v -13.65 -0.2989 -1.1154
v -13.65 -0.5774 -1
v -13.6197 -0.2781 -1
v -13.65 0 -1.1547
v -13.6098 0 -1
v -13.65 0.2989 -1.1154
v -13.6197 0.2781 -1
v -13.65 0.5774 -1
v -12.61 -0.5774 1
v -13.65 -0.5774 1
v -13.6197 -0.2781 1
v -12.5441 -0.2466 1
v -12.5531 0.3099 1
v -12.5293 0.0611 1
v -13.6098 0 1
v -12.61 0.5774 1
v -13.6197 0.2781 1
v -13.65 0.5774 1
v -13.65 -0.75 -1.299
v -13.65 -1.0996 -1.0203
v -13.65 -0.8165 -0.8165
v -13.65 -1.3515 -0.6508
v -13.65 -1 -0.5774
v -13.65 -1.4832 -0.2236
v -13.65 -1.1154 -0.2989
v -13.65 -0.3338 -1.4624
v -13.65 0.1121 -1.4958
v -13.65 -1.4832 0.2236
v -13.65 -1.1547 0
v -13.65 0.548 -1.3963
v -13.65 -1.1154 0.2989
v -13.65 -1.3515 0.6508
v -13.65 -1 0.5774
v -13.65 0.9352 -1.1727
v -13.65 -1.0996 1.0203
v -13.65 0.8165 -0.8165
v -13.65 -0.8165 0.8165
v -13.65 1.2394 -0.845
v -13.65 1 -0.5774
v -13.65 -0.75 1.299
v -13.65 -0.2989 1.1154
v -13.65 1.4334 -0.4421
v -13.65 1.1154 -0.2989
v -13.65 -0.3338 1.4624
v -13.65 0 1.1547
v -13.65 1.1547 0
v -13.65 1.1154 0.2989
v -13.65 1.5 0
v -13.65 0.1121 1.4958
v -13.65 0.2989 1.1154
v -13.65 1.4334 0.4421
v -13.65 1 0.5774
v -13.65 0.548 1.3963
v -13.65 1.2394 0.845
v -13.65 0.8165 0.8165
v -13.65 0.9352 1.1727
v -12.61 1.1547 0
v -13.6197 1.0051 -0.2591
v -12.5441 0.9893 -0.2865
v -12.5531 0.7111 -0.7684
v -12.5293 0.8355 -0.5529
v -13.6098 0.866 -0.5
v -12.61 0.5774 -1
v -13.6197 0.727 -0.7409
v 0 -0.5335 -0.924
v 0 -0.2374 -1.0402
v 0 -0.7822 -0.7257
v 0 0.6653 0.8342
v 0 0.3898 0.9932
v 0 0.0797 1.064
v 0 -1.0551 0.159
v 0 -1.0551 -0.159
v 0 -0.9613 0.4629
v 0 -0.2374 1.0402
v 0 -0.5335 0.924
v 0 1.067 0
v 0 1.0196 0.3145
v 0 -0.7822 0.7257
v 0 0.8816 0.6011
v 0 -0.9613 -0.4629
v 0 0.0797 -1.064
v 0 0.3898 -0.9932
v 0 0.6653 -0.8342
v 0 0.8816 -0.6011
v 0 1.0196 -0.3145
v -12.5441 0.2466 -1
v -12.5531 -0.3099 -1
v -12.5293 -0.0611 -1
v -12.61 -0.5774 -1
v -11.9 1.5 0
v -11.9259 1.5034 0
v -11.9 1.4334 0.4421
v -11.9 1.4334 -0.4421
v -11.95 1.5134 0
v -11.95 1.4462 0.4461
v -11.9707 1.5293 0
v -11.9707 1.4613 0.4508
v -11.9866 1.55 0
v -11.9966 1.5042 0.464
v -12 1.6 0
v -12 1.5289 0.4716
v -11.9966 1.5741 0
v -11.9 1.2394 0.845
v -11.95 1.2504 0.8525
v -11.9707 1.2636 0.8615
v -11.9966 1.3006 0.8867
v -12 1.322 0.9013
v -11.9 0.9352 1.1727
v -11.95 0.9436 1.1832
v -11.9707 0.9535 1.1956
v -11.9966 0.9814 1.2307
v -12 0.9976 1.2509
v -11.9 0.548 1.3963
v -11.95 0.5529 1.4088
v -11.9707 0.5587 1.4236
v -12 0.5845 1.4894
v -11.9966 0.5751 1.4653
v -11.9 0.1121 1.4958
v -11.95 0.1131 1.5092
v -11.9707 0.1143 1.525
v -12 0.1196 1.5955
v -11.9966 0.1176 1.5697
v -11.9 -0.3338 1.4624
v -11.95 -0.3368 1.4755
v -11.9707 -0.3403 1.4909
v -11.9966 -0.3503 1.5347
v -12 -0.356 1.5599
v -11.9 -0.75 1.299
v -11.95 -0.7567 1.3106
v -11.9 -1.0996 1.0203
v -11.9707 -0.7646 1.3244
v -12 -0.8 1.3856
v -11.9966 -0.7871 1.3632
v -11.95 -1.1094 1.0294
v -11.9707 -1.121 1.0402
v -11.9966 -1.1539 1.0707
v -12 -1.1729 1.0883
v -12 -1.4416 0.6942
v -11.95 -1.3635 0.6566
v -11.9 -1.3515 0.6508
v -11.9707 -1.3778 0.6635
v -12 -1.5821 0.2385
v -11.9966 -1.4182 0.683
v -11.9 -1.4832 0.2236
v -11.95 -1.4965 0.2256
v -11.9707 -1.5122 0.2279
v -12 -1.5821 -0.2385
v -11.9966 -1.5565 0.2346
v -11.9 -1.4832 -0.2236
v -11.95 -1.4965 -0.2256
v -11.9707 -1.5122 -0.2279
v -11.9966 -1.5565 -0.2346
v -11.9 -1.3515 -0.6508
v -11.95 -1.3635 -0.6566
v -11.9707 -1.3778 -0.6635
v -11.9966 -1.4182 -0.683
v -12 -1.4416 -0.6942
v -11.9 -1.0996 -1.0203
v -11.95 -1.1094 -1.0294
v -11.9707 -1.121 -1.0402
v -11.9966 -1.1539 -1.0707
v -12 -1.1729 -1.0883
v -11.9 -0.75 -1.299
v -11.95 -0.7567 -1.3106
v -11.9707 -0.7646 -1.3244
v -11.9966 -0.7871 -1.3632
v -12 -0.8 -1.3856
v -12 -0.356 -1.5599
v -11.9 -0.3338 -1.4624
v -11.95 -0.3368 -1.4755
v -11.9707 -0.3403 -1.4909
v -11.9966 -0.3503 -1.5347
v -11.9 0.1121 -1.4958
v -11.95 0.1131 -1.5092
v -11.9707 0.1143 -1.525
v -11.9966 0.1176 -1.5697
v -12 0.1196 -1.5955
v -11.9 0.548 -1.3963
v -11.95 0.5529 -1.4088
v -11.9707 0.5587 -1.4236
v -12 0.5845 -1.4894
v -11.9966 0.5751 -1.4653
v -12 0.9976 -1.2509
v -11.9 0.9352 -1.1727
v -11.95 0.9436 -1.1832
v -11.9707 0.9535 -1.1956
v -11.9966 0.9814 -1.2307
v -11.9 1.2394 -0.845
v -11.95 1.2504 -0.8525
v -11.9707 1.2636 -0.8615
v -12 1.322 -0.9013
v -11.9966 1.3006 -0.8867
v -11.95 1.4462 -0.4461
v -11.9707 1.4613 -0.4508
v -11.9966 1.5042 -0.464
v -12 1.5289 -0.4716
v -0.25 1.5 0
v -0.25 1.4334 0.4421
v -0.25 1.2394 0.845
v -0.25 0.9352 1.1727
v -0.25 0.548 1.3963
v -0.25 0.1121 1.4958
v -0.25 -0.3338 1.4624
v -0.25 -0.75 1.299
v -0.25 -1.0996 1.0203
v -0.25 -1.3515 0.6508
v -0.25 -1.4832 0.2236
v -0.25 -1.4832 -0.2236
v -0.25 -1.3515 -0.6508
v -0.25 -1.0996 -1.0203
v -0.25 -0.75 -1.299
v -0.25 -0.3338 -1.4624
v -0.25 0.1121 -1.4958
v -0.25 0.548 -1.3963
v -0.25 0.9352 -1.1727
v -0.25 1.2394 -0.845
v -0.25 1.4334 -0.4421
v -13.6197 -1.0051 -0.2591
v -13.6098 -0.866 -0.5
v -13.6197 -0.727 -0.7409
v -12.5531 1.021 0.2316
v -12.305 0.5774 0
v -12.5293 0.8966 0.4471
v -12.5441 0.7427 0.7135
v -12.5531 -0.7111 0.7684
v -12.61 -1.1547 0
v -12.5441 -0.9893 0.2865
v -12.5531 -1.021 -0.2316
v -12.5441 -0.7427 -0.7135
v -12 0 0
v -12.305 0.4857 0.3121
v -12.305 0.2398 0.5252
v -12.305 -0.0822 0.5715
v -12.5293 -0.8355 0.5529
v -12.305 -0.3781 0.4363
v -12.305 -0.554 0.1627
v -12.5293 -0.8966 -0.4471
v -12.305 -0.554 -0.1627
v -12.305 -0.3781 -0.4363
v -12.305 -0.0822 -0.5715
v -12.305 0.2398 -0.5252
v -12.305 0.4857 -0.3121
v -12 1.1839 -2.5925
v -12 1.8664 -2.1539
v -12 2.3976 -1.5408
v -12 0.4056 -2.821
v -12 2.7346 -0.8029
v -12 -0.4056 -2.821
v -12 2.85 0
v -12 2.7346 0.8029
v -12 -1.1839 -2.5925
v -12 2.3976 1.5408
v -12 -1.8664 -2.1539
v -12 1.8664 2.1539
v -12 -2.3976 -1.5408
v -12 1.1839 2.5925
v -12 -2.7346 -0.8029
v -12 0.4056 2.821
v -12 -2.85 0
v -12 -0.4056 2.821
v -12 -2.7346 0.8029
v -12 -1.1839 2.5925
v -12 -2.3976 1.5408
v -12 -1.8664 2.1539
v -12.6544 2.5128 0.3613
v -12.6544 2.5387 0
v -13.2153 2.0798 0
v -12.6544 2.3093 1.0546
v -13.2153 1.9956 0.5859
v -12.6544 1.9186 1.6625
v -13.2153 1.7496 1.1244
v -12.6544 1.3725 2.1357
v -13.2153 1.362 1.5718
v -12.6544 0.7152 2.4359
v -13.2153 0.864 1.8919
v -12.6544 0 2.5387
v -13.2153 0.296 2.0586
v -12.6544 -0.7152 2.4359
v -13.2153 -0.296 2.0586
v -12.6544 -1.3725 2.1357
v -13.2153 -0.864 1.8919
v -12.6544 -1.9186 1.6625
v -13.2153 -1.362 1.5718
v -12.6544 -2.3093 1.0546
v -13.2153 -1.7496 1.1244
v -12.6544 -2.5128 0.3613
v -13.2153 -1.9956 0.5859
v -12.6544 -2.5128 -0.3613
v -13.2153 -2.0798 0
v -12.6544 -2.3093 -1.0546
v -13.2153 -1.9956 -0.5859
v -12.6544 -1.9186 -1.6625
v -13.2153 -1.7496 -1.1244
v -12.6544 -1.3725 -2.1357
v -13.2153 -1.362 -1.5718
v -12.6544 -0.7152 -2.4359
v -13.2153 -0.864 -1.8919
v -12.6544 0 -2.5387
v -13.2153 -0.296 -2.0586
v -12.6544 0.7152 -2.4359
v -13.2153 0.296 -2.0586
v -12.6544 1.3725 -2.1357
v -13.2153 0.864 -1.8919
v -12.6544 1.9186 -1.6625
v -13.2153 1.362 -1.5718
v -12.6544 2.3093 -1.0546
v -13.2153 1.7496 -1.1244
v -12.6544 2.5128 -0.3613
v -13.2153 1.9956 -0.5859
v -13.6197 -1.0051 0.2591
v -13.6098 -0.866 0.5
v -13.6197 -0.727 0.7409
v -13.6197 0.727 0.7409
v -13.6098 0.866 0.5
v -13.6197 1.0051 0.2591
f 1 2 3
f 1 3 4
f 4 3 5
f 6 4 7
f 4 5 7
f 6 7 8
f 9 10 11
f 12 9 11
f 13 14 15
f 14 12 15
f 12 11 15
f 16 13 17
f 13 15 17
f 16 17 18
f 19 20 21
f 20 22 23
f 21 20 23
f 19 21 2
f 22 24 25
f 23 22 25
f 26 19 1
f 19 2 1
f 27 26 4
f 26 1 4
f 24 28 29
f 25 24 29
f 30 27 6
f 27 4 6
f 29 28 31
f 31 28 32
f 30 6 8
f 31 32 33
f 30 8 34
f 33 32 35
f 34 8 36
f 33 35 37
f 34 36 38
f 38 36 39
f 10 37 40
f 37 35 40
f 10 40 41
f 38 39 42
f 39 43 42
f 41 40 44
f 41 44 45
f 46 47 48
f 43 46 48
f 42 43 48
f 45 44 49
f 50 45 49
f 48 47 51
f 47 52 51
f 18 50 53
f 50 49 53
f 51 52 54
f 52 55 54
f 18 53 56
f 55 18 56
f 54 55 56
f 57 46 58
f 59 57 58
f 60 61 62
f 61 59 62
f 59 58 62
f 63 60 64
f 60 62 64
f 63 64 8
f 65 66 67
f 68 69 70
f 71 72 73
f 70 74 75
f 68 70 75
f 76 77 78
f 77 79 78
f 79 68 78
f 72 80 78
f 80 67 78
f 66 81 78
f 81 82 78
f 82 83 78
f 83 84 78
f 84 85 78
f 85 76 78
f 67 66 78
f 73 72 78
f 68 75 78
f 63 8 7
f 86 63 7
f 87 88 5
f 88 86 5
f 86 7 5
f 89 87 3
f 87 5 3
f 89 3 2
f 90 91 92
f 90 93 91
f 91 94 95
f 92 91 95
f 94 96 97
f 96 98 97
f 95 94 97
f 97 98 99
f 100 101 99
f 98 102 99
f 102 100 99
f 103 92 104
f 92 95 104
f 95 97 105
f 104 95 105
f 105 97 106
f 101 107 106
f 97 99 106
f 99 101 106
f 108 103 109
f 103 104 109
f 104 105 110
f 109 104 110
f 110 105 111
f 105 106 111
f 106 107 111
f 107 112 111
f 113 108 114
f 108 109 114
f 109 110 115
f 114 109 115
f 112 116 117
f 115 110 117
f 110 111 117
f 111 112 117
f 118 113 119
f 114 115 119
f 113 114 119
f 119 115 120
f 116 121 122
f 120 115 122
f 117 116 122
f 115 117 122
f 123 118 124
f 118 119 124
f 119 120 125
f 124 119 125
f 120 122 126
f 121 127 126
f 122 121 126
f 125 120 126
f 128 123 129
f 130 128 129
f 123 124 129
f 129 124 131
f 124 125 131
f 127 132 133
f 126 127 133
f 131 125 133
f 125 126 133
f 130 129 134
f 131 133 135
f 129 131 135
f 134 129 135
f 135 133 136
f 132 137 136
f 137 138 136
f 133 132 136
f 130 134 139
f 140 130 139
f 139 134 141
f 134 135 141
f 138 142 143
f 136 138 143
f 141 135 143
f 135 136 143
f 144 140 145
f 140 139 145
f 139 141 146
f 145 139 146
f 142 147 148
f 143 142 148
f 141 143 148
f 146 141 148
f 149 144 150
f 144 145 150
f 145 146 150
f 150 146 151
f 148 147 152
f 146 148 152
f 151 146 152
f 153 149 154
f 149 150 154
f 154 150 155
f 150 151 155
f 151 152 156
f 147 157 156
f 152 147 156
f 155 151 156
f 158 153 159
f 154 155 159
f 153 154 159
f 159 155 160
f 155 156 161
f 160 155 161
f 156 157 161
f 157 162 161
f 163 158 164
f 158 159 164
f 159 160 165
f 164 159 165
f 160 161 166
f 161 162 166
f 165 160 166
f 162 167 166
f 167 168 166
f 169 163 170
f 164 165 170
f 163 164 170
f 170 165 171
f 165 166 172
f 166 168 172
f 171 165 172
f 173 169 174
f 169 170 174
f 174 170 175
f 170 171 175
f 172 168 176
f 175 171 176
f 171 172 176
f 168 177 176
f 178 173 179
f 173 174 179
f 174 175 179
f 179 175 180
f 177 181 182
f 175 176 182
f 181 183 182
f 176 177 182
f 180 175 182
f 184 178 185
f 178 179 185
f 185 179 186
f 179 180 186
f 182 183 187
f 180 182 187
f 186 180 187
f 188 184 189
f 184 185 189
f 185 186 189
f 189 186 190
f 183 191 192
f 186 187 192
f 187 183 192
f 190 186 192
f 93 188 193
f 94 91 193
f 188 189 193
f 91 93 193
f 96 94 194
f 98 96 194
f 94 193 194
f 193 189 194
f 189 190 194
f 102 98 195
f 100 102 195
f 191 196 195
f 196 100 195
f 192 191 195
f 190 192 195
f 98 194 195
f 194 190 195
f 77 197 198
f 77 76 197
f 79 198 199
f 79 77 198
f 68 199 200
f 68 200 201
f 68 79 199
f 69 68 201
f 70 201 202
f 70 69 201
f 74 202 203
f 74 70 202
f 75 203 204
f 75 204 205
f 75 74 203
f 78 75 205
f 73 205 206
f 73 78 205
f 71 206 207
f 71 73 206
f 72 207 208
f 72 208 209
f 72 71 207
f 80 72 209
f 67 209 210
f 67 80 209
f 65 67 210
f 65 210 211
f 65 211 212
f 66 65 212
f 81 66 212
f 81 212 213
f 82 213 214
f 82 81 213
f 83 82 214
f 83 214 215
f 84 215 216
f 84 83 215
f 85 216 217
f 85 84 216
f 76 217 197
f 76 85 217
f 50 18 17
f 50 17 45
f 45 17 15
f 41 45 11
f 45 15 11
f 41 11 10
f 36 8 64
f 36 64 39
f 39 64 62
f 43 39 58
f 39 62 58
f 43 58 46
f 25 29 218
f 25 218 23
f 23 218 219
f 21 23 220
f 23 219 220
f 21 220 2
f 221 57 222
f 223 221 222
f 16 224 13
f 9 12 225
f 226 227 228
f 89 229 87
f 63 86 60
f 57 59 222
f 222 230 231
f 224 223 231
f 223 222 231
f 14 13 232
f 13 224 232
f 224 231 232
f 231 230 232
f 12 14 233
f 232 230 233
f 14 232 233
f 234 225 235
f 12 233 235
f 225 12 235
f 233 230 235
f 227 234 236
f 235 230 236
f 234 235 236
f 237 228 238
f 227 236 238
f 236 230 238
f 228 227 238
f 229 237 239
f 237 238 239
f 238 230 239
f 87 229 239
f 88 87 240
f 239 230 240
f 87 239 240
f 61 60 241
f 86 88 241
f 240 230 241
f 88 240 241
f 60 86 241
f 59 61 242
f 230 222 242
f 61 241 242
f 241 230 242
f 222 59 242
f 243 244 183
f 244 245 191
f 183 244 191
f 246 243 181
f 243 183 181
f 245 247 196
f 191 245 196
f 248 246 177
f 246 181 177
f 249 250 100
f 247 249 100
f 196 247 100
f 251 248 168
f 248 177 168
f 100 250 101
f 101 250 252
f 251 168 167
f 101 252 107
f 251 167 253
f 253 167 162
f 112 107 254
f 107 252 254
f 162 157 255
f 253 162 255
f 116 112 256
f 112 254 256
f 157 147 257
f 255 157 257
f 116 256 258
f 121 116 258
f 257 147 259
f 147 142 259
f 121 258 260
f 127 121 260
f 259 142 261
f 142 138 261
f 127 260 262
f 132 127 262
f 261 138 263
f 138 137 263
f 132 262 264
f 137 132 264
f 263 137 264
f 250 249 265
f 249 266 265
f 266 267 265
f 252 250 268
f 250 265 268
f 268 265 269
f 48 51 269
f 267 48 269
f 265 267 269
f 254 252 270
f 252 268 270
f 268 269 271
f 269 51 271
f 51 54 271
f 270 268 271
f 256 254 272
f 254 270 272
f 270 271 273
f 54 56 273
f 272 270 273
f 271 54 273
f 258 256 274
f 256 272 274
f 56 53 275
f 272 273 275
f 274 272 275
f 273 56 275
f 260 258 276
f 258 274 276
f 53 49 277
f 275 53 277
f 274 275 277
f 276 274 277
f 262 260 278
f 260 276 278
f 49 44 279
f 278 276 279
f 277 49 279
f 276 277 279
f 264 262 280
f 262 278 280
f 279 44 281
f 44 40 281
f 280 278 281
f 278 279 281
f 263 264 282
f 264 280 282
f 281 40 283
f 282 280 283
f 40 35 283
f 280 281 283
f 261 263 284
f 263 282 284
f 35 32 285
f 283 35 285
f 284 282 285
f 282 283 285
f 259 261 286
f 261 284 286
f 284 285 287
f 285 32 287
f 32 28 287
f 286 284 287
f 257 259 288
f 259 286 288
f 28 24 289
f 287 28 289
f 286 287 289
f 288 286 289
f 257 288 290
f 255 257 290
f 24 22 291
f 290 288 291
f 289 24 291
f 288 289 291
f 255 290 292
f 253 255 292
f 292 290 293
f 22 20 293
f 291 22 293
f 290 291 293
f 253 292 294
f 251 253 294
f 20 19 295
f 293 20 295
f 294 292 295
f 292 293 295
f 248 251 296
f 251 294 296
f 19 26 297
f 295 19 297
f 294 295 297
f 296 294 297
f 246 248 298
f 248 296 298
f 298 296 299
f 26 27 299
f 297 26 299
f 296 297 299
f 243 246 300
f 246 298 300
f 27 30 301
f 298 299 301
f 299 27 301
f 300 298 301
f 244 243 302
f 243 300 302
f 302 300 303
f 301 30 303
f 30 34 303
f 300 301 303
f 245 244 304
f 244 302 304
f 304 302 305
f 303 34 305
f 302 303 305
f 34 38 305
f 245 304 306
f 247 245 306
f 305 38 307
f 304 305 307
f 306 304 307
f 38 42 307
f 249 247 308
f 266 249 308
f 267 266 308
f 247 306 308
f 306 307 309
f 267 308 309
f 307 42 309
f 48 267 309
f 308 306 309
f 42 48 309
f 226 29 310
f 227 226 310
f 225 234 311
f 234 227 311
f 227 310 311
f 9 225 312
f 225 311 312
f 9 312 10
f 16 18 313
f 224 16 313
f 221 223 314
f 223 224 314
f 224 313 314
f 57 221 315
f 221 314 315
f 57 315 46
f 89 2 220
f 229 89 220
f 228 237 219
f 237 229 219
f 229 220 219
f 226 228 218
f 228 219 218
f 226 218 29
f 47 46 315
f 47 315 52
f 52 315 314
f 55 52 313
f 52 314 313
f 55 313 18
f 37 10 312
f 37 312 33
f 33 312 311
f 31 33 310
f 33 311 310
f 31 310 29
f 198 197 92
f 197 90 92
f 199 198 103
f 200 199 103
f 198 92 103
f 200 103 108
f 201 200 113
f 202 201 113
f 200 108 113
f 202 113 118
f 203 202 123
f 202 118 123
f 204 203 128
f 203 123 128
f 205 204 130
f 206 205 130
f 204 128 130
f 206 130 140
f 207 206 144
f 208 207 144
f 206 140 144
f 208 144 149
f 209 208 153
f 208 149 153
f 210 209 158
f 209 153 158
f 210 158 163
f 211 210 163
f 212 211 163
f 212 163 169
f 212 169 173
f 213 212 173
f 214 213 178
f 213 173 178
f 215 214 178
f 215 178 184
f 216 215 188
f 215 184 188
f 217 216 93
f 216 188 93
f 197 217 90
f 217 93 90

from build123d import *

# Parameters (mm, degrees)
CUT_EXTRUDE_1_DEPTH = 1.65


with BuildPart() as part:
    # 草图1 → 旋转1 (revolve)
    with BuildSketch(Plane.XY):
        with BuildLine():
            Line((0, 1.5), (-11.9, 1.5))
            ThreePointArc((-11.9, 1.5), (-11.970710678, 1.529289322), (-12, 1.6))
            Line((-12, 1.6), (-12, 2.85))
            ThreePointArc((-12, 2.85), (-12.948716751, 2.326209363), (-13.65, 1.5))
            Line((-13.65, 1.5), (-13.65, 0))
            Line((-13.65, 0), (0, 0))
            Line((0, 0), (0, 1.5))
        make_face()
    revolve(axis=Axis((-13.65, 0, 0), (1, 0, 0)))

    # 草图2 → 切除-拉伸1 (cut)
    with BuildSketch(Plane.ZY.offset(13.65)):
        Polygon((0, 1.154700538), (-1, 0.577350269), (-1, -0.577350269), (0, -1.154700538), (1, -0.577350269), (1, 0.577350269), align=None)
    extrude(amount=-CUT_EXTRUDE_1_DEPTH, mode=Mode.SUBTRACT)

    # 草图6 → 旋转2 (revolve)
    with BuildSketch(Plane.XY):
        Polygon((-12.61, 1.154700538), (-12, 0), (-11.7, 0), (-11.7, 1.154700538), align=None)
    revolve(axis=Axis((-13.65, 0, 0), (1, 0, 0)))

    # 草图7 → 切除-旋转5 (revolve, cut)
    with BuildSketch(Plane.XY):
        Polygon((-13.65, 1.154700538), (-13.35, 0), (-13.65, 0), align=None)
    revolve(axis=Axis((-13.65, 0, 0), (1, 0, 0)), mode=Mode.SUBTRACT)

    # 草图4 → 切除-旋转1 (revolve, cut)
    with BuildSketch(Plane.XY):
        Polygon((-0.25, 1.5), (0, 1.066987298), (0.25, 1.5), align=None)
    revolve(axis=Axis((-0.25, 0, 0), (1, 0, 0)), mode=Mode.SUBTRACT)


solid = part.part
